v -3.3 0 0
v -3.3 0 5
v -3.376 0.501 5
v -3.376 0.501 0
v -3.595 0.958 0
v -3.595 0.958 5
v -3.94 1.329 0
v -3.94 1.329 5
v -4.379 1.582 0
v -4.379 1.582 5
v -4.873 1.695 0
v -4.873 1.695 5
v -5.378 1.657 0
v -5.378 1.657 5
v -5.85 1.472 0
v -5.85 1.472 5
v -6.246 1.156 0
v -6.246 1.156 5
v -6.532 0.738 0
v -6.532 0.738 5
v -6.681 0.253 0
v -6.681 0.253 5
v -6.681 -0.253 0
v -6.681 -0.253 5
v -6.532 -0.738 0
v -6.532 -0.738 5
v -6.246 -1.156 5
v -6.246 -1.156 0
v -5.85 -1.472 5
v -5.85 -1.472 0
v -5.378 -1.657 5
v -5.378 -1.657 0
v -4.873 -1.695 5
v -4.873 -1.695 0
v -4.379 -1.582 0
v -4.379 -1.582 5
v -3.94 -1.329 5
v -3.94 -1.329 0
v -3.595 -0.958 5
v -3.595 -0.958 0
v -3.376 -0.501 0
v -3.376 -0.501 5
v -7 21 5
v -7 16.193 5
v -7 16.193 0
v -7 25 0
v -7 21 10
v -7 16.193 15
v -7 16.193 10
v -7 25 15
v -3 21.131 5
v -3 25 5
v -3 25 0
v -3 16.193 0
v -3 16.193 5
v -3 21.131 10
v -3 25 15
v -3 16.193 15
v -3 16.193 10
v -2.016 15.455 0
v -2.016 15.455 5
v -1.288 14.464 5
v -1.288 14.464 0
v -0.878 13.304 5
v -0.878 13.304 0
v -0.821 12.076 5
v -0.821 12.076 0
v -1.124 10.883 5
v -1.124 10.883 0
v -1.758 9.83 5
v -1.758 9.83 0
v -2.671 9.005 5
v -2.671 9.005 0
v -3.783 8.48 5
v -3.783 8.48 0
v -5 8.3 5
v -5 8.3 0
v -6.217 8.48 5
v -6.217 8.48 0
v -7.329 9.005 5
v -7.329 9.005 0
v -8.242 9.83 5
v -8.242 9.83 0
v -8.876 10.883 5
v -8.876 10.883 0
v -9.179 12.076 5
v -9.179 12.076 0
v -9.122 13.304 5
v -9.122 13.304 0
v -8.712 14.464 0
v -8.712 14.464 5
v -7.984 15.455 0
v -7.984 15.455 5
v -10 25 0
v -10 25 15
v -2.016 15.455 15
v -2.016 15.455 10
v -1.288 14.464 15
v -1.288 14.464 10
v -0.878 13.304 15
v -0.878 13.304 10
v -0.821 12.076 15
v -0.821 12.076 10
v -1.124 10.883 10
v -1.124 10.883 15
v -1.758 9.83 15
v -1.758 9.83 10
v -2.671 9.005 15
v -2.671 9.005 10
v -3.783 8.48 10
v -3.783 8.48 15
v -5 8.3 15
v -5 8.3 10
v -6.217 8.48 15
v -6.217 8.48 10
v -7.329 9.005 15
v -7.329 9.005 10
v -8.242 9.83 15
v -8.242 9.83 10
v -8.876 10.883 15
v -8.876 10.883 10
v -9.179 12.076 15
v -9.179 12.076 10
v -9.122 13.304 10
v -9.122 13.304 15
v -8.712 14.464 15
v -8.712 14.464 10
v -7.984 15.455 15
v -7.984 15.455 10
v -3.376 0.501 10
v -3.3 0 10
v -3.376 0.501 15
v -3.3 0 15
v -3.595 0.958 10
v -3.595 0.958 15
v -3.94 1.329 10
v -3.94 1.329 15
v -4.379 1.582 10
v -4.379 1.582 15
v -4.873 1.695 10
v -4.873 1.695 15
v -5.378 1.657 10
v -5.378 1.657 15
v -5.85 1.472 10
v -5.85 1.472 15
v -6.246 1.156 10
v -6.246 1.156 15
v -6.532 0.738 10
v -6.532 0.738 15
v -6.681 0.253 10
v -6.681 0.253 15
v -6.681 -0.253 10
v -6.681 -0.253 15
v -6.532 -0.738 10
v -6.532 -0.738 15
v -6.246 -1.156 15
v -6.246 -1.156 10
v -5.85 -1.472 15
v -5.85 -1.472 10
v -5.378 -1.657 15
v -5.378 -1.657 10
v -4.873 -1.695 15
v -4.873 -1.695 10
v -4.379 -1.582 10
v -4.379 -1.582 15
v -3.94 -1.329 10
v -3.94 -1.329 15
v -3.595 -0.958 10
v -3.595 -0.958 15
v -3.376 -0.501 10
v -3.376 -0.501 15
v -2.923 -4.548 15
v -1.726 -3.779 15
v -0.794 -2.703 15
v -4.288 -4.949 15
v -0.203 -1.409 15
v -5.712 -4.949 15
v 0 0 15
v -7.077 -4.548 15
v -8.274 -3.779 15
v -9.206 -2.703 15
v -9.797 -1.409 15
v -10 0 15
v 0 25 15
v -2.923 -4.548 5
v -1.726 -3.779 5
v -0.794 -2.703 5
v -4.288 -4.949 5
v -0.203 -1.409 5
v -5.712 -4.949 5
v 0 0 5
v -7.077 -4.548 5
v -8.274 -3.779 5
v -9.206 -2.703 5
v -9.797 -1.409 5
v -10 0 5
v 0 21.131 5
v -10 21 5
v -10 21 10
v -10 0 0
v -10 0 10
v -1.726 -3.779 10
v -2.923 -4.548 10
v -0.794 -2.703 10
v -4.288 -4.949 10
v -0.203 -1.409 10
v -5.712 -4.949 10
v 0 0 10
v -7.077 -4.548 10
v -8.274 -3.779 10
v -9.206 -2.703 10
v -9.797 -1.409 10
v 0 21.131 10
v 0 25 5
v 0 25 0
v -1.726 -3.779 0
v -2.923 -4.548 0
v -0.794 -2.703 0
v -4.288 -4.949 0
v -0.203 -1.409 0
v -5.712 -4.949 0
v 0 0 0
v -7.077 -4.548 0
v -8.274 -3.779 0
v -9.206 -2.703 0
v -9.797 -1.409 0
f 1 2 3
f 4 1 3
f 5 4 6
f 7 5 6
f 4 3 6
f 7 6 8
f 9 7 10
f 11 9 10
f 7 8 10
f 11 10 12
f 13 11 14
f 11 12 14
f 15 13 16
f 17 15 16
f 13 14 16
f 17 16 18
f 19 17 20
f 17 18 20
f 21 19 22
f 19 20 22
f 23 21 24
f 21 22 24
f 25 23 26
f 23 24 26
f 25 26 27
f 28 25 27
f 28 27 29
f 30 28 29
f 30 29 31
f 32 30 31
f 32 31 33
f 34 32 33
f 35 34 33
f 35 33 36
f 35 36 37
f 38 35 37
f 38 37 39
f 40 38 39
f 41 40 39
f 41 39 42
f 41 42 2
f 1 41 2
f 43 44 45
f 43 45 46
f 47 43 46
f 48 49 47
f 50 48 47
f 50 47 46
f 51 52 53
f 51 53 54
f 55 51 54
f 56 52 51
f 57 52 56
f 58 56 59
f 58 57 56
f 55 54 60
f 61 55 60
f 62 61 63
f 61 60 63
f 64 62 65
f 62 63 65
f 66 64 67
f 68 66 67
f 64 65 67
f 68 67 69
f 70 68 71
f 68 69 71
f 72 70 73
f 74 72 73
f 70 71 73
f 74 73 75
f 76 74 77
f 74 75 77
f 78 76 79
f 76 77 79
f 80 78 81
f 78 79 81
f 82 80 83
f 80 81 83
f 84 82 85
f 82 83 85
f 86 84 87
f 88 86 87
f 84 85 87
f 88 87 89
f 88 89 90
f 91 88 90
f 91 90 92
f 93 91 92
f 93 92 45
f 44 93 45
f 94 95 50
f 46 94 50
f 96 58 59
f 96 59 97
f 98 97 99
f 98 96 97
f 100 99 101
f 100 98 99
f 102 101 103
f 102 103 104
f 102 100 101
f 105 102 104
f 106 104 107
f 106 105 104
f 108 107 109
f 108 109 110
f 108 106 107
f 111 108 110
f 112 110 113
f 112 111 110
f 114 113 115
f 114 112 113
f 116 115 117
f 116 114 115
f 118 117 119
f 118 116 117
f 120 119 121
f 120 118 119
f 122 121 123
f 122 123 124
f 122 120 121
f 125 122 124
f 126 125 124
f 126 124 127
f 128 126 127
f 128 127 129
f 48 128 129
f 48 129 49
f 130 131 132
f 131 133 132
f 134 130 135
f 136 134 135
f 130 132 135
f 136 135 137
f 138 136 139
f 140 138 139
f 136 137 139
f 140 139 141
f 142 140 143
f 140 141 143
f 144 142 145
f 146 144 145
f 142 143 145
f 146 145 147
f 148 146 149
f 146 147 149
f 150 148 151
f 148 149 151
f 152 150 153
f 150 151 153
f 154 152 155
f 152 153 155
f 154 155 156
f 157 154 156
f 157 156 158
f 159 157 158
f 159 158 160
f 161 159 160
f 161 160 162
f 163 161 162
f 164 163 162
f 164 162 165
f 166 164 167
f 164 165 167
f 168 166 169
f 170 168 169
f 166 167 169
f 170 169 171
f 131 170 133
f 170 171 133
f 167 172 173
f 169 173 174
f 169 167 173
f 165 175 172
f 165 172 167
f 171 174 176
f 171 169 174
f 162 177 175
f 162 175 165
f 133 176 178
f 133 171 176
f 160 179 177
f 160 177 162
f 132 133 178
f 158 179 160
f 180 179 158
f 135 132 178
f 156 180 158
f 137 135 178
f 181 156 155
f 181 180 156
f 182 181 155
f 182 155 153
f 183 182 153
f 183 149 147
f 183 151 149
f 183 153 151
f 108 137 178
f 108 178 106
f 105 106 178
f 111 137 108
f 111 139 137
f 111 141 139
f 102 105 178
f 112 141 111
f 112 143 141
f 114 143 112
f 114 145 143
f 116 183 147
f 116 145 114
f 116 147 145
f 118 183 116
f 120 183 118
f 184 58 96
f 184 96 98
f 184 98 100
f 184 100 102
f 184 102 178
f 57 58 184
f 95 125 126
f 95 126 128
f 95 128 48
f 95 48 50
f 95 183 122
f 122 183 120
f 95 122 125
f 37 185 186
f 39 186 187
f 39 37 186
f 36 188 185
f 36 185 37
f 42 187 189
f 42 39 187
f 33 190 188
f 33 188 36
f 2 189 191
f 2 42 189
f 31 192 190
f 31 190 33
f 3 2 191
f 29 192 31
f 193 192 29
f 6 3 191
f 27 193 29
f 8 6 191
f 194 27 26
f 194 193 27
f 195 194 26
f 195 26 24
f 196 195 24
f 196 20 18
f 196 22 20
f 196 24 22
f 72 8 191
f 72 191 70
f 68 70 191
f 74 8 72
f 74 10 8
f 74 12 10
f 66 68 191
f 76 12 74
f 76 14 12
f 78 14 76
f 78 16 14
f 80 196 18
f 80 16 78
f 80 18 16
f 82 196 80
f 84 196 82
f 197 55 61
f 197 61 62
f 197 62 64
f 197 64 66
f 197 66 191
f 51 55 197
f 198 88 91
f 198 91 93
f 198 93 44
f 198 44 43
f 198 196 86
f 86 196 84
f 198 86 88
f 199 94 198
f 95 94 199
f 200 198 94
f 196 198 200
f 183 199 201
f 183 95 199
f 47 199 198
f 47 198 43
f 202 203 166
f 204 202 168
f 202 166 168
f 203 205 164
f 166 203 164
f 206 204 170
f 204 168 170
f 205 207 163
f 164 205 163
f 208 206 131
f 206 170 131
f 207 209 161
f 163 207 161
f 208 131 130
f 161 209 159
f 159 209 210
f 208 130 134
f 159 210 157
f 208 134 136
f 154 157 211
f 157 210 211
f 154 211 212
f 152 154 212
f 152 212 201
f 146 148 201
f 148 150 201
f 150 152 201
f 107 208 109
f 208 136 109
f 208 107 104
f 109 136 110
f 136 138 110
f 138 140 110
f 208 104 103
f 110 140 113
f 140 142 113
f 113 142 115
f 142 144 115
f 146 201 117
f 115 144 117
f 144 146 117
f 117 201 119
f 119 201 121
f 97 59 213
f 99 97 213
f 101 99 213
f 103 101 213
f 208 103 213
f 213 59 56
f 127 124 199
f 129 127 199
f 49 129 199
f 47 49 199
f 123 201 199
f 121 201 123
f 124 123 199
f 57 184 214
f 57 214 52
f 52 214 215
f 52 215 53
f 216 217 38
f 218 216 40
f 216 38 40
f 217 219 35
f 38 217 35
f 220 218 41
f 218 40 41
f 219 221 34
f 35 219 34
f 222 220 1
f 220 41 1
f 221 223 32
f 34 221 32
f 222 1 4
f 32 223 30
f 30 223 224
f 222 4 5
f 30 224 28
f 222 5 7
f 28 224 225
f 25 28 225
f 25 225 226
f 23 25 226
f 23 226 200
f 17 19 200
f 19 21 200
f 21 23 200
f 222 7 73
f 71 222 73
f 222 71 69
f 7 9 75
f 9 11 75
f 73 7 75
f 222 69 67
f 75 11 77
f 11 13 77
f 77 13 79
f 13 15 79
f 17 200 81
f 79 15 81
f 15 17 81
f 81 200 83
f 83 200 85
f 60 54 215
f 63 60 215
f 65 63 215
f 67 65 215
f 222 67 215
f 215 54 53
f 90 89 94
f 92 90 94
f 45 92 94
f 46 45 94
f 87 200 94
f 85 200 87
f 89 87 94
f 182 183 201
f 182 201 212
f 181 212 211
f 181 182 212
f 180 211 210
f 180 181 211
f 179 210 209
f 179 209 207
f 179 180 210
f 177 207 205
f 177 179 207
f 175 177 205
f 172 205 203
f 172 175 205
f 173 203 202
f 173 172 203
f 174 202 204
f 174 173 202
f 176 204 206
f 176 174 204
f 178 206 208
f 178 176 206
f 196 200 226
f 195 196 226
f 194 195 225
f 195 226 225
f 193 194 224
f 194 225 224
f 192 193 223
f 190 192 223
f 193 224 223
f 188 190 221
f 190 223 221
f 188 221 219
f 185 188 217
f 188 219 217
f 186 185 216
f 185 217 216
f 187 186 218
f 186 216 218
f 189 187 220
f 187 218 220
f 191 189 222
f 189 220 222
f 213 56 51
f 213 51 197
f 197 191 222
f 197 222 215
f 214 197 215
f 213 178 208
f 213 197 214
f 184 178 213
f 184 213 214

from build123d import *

# Parameters (mm, degrees)
BOSS_EXTRUDE1_DEPTH = 5
SKETCH2_R           = 1.7
CUT_EXTRUDE1_DEPTH  = 28.386127875
SKETCH5_W           = 3
SKETCH5_H           = 4
SKETCH5_H_2         = 3.869300193
BOSS_EXTRUDE2_DEPTH = 10
SKETCH7_R           = 1.7
CUT_EXTRUDE2_DEPTH  = 31.822070015


with BuildPart() as part:
    # Sketch1 → Boss-Extrude1 (new body)
    with BuildSketch(Plane(origin=(0, 0, 0), x_dir=(0, 1, 0), z_dir=(0, 0, 1))):
        with BuildLine():
            Line((0, 0), (25, 0))
            Line((25, 0), (25, 3))
            Line((25, 3), (16.193237063, 3))
            ThreePointArc((16.193237063, 3), (8.3, 5), (16.193237063, 7))
            Line((16.193237063, 7), (25, 7))
            Line((25, 7), (25, 10))
            Line((25, 10), (0, 10))
            ThreePointArc((0, 10), (-5, 5), (0, 0))
        make_face()
    boss_extrude1 = extrude(amount=BOSS_EXTRUDE1_DEPTH)

    # Sketch2 → Cut-Extrude1 (cut, through all)
    with BuildSketch(Plane.XY.offset(5)):
        with Locations((-5, 0)):
            Circle(SKETCH2_R)
    extrude(amount=-CUT_EXTRUDE1_DEPTH, mode=Mode.SUBTRACT)

    # Sketch5 → Boss-Extrude2 (add)
    with BuildSketch(Plane.XY.offset(15)):
        with Locations((-8.5, 23)):
            Rectangle(SKETCH5_W, SKETCH5_H)
        with Locations((-1.5, 23.065349903)):
            Rectangle(SKETCH5_W, SKETCH5_H_2)
    extrude(amount=-BOSS_EXTRUDE2_DEPTH)

    # Mirror2: Boss-Extrude1 across plane
    add(boss_extrude1.mirror(Plane.XY.offset(7.5)))

    # Sketch7 → Cut-Extrude2 (cut, through all)
    with BuildSketch(Plane.XY.offset(15)):
        with Locations((-5, 0)):
            Circle(SKETCH7_R)
    extrude(amount=-CUT_EXTRUDE2_DEPTH, mode=Mode.SUBTRACT)


solid = part.part
